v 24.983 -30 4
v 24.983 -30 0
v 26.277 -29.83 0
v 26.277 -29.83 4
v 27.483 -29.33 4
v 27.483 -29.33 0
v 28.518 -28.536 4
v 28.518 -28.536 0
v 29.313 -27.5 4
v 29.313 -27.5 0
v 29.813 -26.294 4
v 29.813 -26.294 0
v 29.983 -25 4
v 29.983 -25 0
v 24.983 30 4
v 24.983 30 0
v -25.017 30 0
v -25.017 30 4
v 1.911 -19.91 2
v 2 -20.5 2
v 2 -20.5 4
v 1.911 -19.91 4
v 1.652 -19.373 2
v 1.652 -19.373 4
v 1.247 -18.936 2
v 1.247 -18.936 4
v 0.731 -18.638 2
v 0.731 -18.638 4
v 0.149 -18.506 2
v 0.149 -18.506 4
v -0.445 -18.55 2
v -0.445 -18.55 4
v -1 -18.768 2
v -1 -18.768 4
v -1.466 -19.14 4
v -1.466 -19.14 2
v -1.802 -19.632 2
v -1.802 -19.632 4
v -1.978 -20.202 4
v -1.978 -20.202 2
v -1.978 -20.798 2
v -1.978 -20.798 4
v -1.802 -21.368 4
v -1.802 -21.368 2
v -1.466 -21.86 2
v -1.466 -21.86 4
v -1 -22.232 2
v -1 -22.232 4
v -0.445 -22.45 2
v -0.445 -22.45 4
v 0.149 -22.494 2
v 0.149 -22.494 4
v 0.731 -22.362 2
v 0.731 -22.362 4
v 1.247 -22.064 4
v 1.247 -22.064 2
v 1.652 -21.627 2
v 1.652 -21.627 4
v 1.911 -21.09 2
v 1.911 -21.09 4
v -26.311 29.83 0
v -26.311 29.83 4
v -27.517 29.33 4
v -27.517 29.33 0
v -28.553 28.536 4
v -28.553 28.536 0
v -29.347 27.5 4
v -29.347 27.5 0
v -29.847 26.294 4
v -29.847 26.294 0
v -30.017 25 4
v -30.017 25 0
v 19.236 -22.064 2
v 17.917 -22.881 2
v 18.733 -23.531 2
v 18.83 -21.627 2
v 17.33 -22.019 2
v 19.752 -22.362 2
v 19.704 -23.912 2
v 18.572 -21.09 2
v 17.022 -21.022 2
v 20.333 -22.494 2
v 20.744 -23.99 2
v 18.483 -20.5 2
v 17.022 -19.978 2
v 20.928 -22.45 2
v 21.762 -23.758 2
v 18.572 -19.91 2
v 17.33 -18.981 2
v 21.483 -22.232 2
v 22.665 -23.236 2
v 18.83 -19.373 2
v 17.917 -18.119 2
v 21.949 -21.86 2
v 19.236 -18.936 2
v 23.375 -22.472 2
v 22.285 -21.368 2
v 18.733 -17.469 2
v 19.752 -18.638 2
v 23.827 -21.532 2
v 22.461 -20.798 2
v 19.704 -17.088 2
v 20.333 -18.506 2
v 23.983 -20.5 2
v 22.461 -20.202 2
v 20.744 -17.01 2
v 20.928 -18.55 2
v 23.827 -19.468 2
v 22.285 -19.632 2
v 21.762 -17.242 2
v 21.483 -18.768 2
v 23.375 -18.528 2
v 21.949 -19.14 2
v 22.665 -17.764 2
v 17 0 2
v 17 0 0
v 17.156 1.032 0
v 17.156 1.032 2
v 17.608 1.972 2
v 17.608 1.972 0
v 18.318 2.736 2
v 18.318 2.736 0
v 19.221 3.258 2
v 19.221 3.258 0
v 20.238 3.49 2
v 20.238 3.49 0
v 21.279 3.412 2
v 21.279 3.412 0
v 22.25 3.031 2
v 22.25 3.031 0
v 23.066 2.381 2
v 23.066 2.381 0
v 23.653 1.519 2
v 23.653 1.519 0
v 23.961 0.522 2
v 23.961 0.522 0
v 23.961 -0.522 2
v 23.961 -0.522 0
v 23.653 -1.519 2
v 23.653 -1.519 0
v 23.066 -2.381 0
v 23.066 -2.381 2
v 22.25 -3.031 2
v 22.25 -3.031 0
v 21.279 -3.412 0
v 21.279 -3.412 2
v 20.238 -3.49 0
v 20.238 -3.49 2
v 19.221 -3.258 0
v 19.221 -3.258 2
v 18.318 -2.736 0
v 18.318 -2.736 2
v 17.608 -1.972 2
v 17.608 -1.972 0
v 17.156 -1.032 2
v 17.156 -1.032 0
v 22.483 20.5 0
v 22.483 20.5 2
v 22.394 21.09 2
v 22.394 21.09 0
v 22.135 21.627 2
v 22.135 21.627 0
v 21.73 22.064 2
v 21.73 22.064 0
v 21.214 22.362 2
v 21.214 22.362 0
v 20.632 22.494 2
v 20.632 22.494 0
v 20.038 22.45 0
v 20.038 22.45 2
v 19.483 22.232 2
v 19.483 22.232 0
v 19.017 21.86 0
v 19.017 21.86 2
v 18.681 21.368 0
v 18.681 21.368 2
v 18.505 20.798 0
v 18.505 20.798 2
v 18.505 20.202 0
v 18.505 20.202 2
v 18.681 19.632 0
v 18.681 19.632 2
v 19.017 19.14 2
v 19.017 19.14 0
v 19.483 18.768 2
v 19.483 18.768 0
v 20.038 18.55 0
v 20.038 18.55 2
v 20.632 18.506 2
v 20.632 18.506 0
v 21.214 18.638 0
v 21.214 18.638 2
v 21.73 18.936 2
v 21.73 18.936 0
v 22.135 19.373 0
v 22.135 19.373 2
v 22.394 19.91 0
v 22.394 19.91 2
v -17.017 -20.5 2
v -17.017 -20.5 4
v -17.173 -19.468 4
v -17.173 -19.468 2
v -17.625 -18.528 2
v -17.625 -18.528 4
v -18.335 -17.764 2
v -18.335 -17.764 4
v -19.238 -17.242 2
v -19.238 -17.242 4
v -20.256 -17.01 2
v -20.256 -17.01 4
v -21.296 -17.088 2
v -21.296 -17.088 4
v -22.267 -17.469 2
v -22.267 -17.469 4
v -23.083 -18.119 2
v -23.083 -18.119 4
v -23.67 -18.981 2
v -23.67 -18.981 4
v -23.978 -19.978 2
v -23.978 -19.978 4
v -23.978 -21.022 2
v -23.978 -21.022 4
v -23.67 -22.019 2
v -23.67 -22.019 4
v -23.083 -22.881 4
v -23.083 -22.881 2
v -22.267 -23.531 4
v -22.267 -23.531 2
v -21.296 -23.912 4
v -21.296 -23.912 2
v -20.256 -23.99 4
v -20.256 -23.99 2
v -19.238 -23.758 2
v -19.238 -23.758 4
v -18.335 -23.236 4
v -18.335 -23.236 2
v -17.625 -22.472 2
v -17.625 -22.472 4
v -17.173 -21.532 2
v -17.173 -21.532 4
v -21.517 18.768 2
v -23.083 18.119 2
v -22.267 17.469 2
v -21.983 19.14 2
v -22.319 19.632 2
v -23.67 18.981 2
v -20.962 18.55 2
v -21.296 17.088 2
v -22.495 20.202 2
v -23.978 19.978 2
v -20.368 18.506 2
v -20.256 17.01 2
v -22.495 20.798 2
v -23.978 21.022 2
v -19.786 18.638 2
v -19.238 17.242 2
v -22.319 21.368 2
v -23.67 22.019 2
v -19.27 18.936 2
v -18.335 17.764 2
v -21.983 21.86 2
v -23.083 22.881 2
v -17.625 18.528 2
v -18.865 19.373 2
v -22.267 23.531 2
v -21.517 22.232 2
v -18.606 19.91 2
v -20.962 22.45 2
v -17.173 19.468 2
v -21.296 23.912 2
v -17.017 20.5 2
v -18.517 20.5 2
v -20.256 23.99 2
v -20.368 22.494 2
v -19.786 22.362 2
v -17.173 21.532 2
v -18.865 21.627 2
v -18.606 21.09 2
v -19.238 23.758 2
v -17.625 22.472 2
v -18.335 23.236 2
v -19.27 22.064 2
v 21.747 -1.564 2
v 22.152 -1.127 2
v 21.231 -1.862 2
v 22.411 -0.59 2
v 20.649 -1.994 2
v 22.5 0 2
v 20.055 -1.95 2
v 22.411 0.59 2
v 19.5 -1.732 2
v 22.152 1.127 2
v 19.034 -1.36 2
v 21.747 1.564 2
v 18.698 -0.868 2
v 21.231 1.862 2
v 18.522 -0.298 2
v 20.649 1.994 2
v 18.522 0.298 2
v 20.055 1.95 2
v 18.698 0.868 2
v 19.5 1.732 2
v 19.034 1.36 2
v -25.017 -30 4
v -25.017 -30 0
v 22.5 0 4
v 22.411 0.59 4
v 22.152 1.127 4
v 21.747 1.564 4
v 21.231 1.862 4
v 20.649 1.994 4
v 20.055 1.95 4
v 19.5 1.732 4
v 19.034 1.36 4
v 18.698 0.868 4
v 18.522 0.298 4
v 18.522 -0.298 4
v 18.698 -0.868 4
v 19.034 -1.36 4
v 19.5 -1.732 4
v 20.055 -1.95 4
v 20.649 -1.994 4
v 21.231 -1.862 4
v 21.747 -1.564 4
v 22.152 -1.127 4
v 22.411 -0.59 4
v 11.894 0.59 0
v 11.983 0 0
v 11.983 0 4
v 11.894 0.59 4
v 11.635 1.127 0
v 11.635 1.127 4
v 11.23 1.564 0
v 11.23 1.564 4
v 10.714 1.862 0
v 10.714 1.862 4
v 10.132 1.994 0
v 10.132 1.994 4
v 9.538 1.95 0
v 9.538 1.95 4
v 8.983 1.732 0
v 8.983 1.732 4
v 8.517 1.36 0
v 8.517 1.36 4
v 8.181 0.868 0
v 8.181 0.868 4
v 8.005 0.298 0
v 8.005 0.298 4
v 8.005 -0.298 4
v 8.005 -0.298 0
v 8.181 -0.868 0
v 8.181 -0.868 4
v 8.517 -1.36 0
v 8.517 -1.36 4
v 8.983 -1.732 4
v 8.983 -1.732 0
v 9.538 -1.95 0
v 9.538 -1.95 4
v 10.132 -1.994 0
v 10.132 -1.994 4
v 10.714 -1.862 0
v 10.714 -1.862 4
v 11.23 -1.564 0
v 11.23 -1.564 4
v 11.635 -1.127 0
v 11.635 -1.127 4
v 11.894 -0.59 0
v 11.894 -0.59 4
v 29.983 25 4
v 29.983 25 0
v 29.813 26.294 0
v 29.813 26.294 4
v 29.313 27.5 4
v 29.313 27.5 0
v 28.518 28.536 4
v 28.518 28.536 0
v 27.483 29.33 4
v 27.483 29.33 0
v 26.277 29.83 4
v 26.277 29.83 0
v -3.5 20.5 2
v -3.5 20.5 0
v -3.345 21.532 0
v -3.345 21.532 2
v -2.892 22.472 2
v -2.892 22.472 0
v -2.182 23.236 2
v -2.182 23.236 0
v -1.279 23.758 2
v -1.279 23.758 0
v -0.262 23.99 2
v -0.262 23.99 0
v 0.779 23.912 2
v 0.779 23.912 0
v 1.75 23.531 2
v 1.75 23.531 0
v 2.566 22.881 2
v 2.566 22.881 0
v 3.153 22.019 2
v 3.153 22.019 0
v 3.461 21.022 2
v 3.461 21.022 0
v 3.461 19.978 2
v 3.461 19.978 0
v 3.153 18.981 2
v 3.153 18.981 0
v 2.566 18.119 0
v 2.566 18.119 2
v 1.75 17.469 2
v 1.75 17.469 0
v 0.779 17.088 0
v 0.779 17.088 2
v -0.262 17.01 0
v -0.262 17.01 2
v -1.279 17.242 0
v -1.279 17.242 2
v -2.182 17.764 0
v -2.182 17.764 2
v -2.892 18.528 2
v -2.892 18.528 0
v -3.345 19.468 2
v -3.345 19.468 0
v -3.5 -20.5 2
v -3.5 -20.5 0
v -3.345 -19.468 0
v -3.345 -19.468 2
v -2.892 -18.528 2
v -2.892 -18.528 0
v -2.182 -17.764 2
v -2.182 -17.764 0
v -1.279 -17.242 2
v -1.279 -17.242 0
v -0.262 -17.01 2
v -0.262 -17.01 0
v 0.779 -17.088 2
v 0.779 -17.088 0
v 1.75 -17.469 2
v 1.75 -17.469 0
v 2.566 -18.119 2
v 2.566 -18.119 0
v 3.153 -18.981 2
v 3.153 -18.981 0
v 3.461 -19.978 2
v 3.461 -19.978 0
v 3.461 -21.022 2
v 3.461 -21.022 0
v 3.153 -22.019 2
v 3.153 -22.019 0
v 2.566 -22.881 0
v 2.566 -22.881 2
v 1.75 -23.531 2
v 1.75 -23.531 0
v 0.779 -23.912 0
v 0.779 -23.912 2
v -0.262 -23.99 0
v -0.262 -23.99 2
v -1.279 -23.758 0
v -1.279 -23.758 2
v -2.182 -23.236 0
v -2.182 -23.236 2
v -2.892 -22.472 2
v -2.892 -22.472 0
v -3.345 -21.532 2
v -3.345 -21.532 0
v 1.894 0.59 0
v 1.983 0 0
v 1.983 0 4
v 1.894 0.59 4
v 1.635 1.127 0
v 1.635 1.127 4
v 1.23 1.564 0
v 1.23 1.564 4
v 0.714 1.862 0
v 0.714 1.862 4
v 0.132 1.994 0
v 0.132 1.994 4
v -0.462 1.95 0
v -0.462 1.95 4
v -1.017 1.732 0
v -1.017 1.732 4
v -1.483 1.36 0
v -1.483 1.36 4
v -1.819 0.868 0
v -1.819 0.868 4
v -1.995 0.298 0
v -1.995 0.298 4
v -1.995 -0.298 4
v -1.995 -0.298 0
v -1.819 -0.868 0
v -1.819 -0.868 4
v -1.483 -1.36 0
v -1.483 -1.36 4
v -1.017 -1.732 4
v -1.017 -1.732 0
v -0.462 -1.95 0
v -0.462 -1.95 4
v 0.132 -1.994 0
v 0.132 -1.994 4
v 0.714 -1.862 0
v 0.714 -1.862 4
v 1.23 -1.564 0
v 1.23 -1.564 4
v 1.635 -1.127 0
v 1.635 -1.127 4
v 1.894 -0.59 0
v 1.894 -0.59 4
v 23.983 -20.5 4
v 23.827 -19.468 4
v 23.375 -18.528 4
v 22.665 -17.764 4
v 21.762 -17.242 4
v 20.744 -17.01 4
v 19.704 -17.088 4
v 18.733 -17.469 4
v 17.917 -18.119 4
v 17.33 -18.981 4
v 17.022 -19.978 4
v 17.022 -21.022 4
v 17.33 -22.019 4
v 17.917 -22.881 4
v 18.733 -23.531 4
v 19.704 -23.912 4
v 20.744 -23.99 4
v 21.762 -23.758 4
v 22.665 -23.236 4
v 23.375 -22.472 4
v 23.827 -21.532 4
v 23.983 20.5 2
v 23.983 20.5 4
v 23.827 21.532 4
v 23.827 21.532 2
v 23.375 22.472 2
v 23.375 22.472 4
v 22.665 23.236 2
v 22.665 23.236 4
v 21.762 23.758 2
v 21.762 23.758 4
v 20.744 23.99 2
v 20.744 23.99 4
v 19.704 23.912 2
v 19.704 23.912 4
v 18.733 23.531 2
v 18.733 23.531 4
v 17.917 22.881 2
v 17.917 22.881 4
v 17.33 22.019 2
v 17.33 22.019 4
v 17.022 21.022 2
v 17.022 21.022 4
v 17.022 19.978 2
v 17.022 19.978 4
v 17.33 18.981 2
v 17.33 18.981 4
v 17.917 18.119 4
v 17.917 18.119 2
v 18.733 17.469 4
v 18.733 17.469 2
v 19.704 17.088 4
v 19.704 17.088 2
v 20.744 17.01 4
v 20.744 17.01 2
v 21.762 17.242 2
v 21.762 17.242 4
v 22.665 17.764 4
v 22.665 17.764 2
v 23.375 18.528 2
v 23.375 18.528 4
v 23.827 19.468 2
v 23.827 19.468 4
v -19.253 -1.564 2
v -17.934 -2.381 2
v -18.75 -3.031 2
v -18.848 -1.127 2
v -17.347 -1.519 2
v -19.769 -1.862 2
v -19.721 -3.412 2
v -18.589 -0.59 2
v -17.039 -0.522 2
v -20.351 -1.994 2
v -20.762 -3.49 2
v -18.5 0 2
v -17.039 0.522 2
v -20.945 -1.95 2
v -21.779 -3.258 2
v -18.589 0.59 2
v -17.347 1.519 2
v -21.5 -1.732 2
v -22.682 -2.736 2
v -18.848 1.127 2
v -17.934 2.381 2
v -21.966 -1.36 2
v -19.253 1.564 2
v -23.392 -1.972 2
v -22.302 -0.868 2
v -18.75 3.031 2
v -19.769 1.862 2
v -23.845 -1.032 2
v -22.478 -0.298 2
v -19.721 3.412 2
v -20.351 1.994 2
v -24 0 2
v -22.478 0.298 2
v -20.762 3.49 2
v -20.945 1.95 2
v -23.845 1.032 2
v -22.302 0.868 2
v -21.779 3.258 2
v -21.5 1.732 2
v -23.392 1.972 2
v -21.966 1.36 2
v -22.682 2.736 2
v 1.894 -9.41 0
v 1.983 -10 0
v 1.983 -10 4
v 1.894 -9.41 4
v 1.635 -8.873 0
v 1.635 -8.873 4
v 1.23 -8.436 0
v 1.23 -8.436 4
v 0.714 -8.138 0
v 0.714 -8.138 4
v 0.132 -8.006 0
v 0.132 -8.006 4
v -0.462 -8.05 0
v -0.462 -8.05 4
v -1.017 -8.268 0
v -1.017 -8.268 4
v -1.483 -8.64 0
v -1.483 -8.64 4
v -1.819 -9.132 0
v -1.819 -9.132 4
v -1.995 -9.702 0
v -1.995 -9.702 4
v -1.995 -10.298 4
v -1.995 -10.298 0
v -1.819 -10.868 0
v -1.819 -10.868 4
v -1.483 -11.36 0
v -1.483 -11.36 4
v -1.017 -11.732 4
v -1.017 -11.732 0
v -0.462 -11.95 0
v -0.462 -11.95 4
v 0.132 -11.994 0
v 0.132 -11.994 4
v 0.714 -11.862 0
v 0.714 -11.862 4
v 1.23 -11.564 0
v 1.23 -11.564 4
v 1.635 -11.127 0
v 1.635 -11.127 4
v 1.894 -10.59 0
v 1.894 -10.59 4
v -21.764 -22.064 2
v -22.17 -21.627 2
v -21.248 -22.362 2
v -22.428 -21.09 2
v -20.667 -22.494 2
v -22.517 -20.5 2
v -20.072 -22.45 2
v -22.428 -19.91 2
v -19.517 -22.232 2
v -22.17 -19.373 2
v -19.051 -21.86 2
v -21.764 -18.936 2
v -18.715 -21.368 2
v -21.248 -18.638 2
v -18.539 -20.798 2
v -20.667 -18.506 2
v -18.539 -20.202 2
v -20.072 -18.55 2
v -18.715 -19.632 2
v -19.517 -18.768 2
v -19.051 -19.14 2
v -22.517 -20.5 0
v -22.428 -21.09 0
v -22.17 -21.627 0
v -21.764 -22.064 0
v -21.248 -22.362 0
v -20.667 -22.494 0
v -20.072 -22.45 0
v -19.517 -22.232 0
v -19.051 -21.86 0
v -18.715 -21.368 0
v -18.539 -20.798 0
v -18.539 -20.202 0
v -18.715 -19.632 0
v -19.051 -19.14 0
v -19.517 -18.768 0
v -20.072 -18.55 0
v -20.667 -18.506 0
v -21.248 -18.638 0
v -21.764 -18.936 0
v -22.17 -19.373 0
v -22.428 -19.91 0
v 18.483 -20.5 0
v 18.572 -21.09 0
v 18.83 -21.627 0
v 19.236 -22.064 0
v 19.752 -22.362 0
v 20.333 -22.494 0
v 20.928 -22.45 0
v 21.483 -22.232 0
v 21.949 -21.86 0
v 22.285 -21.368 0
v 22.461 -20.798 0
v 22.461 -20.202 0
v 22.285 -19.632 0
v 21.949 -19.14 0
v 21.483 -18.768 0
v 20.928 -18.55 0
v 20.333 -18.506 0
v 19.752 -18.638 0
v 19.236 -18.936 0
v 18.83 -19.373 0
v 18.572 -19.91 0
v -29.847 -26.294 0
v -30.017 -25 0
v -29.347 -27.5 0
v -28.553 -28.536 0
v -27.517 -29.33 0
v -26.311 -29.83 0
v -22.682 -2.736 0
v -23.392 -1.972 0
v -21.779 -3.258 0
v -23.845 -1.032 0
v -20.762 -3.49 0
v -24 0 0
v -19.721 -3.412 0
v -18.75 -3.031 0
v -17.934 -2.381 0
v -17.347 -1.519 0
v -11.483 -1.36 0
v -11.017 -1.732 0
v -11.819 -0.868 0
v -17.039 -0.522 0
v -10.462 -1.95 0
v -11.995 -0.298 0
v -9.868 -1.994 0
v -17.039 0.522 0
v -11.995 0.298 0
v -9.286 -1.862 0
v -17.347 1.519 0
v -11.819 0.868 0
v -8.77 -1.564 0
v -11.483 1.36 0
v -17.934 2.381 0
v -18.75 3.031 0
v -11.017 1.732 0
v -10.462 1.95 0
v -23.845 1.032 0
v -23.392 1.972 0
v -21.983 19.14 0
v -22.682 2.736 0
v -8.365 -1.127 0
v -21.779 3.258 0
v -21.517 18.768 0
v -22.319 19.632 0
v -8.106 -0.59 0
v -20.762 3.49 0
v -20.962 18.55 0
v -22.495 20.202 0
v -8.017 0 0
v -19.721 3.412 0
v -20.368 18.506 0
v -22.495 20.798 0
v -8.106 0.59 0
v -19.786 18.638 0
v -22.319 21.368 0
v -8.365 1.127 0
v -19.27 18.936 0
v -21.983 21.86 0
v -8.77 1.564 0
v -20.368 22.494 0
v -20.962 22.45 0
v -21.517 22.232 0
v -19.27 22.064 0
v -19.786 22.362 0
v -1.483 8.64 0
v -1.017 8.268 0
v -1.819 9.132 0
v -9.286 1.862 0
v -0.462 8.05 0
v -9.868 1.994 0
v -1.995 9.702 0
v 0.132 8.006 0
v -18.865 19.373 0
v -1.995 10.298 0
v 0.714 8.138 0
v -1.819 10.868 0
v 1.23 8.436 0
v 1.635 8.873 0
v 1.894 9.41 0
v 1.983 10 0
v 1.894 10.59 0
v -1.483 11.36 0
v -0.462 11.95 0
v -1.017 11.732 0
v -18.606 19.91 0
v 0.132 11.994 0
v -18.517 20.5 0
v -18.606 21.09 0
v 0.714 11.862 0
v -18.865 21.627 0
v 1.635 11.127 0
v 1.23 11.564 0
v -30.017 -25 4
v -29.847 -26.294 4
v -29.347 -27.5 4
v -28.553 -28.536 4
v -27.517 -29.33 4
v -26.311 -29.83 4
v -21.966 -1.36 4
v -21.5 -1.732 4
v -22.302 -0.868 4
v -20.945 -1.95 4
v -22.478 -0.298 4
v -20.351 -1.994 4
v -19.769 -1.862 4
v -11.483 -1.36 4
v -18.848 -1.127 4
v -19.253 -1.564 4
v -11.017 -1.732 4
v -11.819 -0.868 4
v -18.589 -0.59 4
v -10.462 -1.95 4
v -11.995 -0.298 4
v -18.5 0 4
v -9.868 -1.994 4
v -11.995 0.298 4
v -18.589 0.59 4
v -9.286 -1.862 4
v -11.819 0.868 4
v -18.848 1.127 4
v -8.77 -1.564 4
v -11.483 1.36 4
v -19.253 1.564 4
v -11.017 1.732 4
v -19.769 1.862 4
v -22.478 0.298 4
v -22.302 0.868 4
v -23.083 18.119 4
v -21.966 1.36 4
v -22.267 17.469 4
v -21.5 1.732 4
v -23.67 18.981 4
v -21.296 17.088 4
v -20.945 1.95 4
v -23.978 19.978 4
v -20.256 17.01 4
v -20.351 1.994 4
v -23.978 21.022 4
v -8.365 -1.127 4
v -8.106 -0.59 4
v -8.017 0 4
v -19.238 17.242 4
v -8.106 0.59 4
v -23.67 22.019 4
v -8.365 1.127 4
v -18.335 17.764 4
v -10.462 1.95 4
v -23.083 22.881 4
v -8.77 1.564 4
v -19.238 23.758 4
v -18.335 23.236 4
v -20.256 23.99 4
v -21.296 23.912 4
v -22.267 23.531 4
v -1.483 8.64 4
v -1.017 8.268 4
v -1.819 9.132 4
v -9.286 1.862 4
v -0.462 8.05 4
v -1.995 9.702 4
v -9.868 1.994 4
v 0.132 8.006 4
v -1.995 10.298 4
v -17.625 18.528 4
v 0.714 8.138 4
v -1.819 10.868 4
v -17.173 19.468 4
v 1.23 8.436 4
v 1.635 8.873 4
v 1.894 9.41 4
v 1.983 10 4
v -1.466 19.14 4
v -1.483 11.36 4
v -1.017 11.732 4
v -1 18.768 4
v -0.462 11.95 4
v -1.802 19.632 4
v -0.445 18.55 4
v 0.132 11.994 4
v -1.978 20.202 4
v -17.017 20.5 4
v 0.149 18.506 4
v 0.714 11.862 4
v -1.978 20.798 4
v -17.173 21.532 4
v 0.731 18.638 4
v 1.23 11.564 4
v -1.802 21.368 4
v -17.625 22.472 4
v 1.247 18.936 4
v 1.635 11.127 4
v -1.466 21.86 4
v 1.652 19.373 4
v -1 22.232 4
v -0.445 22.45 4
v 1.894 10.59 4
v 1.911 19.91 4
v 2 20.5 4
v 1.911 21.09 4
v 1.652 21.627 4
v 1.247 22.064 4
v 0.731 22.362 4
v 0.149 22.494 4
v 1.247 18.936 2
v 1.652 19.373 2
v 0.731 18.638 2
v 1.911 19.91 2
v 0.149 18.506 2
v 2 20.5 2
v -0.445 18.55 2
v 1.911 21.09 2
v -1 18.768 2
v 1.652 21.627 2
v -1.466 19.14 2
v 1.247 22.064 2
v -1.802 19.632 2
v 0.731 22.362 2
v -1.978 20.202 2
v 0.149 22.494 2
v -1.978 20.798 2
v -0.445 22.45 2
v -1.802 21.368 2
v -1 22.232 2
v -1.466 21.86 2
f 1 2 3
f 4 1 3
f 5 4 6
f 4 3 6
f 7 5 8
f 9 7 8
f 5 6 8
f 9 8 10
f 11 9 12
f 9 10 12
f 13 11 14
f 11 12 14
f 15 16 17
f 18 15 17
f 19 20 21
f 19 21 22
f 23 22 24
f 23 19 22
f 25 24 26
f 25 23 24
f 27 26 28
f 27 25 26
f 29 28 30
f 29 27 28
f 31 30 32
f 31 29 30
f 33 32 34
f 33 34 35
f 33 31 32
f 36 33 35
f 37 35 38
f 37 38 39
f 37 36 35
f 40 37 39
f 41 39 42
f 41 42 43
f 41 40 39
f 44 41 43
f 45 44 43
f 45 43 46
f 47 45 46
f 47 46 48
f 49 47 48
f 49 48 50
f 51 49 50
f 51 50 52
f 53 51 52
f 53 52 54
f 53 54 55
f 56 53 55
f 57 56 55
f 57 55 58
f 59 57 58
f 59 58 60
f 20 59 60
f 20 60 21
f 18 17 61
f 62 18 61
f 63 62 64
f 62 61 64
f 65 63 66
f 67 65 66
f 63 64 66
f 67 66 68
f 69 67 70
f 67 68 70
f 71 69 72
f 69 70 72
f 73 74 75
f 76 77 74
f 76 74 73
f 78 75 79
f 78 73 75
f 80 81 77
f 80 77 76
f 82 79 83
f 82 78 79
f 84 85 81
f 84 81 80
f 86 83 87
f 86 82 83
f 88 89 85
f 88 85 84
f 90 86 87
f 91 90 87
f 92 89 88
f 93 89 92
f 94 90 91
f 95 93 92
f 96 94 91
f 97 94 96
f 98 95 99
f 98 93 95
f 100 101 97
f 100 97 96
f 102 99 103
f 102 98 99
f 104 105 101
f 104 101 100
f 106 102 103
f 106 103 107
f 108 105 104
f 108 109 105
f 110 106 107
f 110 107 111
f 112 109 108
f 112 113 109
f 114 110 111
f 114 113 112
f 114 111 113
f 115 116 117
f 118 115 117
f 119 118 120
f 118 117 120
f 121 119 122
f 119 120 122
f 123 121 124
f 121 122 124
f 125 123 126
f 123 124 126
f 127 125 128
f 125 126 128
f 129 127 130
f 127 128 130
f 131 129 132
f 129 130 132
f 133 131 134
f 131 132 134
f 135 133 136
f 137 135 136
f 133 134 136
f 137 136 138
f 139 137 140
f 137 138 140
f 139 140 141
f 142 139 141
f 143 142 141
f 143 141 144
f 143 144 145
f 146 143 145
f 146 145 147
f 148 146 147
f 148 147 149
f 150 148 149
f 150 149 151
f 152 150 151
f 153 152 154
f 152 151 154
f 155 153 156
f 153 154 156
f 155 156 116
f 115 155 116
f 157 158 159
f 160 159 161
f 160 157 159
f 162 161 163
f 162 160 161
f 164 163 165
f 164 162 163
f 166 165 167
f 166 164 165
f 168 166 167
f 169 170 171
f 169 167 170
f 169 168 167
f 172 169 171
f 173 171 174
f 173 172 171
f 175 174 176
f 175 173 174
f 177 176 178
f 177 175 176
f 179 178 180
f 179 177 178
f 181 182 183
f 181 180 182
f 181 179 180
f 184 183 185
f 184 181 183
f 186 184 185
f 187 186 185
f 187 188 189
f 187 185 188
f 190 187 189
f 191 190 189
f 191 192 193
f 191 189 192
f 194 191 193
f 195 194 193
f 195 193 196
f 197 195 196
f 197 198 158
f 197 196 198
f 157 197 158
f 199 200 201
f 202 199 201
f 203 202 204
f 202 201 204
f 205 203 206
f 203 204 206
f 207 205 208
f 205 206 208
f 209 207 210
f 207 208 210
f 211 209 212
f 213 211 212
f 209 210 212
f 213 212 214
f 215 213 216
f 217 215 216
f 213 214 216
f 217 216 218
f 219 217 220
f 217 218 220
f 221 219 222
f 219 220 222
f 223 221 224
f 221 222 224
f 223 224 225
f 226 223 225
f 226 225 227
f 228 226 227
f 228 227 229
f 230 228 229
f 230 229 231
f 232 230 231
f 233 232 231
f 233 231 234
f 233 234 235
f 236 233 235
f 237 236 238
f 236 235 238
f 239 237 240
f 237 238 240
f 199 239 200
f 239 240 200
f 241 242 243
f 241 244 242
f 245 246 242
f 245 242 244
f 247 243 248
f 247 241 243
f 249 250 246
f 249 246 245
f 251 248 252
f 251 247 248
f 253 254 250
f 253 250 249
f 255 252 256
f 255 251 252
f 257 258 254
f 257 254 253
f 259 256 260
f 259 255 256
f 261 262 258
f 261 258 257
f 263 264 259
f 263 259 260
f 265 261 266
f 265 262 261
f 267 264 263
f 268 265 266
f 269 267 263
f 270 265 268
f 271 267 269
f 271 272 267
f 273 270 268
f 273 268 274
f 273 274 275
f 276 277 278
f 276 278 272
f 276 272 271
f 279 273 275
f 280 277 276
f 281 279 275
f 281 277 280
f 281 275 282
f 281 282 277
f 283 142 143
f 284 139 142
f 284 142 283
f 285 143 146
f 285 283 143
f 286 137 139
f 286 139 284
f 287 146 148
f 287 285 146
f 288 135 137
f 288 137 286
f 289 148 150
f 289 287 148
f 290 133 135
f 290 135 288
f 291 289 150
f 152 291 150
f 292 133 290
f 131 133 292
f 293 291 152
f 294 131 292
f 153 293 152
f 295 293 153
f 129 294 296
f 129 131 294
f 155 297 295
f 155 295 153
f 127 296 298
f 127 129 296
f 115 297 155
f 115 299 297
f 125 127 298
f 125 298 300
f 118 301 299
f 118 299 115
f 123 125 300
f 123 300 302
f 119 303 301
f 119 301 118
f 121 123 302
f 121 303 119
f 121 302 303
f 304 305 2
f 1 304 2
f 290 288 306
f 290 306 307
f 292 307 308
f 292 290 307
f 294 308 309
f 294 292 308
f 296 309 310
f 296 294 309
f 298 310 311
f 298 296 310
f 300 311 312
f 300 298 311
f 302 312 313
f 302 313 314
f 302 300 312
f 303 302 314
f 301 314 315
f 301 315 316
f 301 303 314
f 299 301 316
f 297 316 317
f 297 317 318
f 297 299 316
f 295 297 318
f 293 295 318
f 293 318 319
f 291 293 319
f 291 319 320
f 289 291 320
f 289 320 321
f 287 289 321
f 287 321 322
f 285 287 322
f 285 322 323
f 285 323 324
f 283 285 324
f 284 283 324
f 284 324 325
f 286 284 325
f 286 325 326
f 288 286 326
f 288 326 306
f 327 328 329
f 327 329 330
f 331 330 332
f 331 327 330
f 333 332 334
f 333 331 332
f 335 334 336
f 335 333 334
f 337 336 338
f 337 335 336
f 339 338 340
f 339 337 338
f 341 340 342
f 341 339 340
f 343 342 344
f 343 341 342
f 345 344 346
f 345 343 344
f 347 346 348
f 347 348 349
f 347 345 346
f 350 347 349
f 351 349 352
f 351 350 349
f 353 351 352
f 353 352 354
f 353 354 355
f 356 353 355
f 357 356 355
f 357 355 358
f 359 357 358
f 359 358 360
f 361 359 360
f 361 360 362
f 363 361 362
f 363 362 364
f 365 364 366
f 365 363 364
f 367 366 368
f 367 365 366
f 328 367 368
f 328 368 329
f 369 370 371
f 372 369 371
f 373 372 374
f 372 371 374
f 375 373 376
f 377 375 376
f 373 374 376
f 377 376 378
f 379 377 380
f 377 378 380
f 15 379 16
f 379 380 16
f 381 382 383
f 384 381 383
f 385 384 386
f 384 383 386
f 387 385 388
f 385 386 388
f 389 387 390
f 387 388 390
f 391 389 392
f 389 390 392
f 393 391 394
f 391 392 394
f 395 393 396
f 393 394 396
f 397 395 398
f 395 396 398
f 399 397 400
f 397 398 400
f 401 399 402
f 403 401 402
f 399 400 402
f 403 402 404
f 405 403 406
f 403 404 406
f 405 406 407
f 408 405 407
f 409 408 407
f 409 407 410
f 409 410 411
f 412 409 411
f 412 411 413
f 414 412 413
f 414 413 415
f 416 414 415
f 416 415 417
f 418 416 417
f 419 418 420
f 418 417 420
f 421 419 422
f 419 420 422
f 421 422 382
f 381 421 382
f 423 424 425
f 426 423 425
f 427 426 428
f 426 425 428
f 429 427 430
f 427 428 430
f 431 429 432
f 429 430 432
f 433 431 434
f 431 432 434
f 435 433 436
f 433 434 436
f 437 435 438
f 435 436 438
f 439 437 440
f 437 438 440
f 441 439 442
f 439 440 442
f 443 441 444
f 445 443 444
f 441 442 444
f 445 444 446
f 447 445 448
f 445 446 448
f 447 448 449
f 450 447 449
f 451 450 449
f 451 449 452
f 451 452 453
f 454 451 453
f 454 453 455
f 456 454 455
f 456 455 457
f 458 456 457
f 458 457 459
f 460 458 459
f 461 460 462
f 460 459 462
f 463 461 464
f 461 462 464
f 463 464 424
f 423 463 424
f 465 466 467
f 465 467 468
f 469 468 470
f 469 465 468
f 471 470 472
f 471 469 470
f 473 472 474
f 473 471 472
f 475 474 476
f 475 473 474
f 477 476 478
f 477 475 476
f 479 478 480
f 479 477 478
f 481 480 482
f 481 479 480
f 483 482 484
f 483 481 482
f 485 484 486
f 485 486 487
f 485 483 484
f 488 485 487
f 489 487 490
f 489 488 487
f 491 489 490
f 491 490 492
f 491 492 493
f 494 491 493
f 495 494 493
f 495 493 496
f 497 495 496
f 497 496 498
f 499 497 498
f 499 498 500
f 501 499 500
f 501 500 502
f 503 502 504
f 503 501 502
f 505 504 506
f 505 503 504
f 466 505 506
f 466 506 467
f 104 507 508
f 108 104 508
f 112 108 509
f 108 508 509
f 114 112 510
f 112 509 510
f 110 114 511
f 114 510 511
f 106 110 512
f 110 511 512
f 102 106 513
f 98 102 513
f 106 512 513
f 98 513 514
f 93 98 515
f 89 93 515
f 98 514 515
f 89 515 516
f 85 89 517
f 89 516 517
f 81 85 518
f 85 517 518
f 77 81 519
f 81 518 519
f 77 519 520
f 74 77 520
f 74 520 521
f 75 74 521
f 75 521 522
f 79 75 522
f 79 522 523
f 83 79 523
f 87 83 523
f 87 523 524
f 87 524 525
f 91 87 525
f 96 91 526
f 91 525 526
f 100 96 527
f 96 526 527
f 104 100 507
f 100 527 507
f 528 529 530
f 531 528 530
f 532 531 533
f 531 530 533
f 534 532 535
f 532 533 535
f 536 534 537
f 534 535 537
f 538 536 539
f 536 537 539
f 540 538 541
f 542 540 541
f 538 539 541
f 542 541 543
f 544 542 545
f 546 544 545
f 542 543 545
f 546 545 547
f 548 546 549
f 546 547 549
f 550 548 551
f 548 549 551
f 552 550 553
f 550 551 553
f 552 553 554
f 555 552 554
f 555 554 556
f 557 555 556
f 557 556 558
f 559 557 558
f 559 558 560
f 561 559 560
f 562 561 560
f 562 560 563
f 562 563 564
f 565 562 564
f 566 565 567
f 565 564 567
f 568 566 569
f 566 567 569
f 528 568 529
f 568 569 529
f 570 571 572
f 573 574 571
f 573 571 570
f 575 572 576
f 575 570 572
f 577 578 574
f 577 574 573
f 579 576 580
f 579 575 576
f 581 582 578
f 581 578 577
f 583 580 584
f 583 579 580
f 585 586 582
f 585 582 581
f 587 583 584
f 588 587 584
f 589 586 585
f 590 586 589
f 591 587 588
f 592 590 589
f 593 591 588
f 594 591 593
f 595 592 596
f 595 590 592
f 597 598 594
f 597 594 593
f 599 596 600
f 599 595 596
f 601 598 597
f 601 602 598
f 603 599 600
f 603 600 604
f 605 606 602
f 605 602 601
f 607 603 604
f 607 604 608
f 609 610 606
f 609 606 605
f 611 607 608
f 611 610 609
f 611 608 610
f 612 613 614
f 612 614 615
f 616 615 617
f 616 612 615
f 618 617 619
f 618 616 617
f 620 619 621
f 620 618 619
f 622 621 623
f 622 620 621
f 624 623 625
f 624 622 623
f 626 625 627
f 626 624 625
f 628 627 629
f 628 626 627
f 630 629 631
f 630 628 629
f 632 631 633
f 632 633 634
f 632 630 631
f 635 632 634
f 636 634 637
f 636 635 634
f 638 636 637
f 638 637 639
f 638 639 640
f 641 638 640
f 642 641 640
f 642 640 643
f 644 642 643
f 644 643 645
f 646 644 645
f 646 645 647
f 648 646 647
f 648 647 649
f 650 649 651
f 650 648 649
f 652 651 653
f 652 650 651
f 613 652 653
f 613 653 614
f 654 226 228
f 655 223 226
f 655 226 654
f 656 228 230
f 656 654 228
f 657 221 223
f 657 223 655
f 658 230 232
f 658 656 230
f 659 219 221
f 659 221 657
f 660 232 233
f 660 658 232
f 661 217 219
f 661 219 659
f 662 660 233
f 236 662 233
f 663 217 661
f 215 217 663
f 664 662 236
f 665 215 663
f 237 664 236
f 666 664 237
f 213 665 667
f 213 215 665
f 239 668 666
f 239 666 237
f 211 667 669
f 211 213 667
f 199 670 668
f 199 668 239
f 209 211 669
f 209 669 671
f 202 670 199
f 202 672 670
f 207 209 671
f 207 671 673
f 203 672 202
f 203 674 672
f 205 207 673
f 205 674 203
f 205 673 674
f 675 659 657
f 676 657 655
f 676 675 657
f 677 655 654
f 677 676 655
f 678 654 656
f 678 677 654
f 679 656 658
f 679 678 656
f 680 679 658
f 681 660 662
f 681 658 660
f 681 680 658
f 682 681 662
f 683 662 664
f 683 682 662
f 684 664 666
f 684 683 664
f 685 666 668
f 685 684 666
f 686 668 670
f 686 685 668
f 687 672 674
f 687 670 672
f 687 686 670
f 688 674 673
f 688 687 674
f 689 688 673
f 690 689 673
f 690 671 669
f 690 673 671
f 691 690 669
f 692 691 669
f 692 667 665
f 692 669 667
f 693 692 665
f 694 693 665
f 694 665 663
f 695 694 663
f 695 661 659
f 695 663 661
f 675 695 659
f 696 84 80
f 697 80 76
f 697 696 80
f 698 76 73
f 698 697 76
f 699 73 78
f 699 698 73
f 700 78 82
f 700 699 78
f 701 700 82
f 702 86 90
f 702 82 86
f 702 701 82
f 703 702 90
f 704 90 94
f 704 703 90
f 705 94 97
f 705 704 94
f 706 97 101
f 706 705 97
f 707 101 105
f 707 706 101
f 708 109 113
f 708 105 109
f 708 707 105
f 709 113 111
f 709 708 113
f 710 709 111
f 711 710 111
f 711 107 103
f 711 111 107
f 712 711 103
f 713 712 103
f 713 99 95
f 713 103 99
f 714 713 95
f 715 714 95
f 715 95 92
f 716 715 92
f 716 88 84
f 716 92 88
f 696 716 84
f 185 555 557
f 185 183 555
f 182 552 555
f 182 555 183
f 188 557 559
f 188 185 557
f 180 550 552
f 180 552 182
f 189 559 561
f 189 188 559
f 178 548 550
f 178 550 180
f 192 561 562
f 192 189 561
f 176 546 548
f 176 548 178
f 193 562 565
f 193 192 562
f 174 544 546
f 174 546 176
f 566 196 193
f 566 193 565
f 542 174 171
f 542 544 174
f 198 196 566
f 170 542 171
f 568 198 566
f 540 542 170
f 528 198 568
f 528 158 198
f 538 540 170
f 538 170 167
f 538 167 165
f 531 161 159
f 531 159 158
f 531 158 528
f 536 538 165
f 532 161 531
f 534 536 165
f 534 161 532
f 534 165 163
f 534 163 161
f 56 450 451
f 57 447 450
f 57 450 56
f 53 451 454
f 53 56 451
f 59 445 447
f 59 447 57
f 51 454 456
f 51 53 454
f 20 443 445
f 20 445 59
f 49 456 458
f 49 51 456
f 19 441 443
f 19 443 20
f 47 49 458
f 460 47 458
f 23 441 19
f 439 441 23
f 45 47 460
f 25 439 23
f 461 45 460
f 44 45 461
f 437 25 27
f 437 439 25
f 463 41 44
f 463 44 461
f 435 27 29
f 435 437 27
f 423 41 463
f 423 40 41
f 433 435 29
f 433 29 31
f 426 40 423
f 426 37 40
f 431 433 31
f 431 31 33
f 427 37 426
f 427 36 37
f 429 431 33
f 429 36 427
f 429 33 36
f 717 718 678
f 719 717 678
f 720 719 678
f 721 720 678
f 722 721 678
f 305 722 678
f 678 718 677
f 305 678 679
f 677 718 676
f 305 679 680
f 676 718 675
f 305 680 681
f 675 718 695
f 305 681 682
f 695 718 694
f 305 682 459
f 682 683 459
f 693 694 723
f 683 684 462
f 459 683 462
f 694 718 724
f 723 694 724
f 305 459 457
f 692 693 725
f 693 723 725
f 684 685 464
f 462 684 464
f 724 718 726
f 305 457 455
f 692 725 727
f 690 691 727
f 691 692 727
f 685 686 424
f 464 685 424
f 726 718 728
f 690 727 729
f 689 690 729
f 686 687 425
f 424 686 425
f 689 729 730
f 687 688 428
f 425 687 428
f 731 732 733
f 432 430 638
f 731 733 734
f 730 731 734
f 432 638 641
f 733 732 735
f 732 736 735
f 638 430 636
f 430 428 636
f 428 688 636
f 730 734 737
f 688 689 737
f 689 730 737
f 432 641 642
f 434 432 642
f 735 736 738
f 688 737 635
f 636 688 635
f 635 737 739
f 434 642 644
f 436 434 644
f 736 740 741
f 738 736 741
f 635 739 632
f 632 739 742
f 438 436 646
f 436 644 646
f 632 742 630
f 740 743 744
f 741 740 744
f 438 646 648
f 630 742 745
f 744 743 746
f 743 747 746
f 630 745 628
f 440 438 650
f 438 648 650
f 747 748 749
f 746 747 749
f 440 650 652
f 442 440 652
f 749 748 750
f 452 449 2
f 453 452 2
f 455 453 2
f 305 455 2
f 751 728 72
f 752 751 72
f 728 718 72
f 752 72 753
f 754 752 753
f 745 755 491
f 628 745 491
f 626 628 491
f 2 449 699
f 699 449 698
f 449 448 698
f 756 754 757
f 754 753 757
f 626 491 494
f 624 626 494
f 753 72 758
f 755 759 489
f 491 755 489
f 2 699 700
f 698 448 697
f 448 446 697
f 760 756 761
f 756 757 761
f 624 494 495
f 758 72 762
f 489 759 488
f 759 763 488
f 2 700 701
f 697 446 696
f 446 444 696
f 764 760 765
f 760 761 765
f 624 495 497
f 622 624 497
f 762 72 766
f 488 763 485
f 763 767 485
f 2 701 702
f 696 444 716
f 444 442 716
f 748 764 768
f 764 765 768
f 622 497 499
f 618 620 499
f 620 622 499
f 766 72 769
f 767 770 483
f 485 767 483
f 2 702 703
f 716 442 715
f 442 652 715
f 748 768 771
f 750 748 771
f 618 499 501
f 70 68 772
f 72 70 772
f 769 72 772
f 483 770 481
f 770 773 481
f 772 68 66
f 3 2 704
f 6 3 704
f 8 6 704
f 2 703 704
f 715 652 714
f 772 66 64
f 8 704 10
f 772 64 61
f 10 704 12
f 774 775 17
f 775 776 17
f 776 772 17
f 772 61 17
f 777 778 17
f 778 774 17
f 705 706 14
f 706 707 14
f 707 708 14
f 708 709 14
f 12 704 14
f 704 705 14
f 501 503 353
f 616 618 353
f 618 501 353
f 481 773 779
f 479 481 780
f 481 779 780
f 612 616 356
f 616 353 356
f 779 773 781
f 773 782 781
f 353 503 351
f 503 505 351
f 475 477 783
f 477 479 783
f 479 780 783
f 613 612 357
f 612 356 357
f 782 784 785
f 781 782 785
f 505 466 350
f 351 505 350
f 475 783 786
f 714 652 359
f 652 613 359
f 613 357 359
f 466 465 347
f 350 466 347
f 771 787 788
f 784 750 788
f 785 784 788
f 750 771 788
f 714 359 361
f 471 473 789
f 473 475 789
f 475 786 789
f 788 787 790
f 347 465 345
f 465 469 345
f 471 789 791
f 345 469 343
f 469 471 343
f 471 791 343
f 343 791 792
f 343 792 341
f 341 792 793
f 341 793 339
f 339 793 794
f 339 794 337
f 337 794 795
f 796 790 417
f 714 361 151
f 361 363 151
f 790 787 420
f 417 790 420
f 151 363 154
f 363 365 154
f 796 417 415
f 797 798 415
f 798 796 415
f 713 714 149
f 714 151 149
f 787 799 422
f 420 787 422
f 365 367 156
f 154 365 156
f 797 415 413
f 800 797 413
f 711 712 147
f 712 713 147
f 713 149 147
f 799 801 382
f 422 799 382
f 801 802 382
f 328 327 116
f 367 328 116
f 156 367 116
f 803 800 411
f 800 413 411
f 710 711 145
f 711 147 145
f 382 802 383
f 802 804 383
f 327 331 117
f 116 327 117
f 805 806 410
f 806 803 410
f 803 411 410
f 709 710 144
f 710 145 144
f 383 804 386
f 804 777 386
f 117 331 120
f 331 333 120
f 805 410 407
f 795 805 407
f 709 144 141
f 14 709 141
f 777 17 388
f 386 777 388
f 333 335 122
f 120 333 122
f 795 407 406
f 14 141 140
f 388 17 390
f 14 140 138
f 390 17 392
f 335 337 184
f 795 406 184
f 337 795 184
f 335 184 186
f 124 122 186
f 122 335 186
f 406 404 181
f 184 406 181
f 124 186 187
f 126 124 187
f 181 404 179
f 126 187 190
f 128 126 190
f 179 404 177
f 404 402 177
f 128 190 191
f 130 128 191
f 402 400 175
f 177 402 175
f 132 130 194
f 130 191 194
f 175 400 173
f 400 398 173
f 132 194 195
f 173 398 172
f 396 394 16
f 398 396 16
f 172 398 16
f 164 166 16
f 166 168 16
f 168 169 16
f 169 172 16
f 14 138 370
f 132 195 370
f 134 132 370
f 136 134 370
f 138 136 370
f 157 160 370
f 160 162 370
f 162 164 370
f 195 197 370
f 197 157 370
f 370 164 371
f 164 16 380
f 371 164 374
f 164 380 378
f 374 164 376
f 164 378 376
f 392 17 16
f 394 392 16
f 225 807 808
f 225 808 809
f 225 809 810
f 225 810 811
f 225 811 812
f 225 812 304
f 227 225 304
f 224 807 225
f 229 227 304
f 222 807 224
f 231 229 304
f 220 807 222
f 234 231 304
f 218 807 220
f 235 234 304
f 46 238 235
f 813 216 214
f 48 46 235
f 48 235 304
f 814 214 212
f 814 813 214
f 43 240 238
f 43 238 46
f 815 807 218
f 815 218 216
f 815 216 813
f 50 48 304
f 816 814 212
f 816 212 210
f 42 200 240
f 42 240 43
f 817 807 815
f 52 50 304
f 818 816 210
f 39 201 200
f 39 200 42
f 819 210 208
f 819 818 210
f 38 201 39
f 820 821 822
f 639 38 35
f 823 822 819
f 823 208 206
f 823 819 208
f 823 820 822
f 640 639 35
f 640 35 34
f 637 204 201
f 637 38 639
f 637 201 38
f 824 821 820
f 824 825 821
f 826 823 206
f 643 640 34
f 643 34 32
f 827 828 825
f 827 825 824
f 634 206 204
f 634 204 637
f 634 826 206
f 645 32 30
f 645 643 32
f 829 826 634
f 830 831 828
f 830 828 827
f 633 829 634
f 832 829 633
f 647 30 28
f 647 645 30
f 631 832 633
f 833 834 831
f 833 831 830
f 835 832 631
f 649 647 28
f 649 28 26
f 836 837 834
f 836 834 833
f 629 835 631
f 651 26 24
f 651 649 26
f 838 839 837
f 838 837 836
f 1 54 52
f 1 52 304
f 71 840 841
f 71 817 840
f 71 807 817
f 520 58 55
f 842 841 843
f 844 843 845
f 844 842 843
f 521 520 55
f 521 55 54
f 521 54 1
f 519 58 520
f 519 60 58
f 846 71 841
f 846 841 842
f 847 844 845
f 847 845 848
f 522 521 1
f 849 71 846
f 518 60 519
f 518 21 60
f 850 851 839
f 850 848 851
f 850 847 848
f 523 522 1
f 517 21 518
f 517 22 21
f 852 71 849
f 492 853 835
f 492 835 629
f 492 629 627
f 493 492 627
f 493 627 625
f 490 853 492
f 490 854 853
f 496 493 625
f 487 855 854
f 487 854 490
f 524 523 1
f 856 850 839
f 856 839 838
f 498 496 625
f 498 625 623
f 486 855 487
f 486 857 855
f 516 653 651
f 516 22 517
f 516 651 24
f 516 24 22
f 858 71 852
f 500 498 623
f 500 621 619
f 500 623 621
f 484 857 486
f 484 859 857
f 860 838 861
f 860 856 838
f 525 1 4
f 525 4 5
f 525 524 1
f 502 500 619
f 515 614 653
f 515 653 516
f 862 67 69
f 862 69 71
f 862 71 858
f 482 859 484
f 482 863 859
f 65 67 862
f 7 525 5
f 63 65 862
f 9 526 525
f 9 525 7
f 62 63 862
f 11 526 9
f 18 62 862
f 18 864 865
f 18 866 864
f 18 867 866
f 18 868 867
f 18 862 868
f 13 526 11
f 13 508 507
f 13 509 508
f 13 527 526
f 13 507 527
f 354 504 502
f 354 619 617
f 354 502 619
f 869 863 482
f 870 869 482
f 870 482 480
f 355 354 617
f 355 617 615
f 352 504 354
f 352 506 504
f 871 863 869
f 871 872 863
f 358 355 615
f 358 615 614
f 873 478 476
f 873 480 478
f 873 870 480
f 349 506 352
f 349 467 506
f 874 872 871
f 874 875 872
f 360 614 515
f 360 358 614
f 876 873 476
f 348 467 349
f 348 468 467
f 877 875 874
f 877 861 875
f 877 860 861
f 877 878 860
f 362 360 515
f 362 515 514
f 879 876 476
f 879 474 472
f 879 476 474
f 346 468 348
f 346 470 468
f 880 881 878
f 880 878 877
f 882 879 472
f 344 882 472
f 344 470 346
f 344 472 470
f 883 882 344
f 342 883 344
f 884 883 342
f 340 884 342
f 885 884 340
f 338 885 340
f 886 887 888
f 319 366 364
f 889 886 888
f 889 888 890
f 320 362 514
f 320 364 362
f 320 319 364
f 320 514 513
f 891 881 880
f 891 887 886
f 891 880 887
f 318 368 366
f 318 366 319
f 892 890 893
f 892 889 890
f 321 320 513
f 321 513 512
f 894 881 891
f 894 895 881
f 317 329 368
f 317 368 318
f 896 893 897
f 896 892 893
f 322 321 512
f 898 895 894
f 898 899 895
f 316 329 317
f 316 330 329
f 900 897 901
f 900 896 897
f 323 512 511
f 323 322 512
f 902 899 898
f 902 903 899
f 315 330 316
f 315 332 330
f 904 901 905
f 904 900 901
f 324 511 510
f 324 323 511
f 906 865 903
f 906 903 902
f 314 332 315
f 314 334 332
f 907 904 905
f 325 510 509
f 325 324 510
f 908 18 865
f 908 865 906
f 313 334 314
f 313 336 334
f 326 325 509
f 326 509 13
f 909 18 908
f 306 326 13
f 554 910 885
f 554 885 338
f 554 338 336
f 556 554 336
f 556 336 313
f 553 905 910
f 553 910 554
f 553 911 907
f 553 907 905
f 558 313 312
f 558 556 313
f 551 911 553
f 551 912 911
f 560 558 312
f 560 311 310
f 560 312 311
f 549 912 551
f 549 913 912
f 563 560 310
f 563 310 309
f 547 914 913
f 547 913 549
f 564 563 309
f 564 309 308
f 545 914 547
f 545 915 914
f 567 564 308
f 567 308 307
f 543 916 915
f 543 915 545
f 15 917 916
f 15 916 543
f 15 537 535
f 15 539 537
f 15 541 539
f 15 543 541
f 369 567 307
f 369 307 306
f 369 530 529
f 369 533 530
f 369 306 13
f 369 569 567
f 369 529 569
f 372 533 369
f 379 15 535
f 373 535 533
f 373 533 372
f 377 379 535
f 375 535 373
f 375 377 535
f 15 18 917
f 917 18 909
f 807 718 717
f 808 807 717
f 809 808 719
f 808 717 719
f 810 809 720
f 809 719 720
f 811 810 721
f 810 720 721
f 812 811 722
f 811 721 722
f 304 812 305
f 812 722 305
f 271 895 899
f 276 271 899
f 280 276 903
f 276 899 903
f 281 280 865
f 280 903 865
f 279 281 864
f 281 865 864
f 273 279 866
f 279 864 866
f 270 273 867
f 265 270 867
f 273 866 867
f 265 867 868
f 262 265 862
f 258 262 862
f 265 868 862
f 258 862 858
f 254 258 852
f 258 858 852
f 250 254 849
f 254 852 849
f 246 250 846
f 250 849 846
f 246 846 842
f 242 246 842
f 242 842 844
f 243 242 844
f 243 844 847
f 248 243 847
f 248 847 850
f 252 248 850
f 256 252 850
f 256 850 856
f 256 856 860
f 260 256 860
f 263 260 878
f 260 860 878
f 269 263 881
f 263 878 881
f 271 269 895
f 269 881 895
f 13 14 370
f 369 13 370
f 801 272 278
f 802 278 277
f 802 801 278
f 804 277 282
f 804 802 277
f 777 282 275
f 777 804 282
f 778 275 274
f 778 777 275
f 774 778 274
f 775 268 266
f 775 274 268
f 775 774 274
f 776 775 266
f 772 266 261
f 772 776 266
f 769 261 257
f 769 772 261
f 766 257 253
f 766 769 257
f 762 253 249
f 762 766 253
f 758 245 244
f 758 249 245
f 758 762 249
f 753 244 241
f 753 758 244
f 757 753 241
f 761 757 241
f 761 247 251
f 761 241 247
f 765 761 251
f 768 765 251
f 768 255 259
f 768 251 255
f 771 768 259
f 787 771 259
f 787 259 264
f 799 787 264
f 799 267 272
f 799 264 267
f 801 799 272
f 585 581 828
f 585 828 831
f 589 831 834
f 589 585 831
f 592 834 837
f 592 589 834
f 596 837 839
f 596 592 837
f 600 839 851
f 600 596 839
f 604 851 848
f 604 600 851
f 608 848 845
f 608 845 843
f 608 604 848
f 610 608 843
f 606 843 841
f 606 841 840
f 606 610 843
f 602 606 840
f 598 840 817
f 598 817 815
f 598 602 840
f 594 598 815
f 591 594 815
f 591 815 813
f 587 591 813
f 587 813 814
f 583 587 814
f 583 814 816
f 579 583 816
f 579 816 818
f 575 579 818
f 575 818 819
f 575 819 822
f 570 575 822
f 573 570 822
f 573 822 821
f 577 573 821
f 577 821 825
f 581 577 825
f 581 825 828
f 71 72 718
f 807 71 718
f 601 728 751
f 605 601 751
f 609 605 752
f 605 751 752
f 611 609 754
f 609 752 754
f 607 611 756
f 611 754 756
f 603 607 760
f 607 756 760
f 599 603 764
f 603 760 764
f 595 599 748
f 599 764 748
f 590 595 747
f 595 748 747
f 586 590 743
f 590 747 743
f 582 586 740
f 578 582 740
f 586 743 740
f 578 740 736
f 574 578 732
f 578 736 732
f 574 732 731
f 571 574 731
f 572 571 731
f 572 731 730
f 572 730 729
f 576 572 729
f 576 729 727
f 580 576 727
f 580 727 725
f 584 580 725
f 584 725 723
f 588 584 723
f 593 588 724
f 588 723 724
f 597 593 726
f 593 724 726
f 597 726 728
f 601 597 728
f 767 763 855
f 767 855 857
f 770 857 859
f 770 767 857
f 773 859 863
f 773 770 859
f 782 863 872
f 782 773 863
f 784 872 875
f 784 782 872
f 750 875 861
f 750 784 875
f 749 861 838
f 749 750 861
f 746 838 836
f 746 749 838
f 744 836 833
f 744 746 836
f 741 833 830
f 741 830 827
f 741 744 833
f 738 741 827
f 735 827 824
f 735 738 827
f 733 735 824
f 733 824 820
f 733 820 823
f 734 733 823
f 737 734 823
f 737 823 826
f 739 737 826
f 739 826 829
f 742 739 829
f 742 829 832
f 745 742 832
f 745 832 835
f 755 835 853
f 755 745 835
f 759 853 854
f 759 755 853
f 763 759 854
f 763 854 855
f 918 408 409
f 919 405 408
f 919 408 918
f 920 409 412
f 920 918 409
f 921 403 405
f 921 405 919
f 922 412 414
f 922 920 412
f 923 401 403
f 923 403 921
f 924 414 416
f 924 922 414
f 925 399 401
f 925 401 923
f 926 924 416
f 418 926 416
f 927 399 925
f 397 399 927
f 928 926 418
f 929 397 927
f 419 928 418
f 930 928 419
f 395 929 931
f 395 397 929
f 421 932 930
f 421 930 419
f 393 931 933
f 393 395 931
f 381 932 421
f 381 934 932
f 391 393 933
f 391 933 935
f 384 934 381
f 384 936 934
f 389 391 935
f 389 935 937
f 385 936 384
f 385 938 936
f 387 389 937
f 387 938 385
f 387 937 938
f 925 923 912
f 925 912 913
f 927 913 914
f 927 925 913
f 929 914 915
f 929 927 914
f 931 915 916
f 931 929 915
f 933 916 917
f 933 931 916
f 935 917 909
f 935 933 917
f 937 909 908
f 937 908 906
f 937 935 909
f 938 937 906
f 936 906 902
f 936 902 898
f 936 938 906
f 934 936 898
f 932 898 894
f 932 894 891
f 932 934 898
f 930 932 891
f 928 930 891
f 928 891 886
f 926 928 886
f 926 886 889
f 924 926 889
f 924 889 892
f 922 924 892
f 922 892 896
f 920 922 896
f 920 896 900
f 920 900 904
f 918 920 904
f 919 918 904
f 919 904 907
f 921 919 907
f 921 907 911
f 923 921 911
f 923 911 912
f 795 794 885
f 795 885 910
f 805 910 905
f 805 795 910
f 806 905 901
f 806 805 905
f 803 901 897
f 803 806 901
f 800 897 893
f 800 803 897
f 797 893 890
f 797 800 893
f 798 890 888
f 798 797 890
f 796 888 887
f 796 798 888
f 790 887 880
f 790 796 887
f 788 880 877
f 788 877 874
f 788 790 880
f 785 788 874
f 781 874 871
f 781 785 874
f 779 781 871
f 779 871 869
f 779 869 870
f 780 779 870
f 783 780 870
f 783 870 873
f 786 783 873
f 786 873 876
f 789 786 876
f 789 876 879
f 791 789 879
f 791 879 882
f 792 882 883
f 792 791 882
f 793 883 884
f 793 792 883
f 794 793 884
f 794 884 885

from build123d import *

# Parameters (mm, degrees)
SKETCH1_R           = 2
BOSS_EXTRUDE2_DEPTH = 4
SKETCH2_R           = 3.5
CUT_EXTRUDE1_DEPTH  = 2
SKETCH3_R           = 3.5
CUT_EXTRUDE2_DEPTH  = 2


with BuildPart() as part:
    # Sketch1 → Boss-Extrude2 (new body)
    with BuildSketch(Plane.XY):
        with BuildLine():
            Line((29.982938543, -25.0000071), (29.982938543, 24.9999929))
            ThreePointArc((29.982938543, 24.9999929), (28.518472449, 28.535526806), (24.982938543, 29.9999929))
            Line((24.982938543, 29.9999929), (-25.017061457, 29.9999929))
            ThreePointArc((-25.017061457, 29.9999929), (-28.552595363, 28.535526806), (-30.017061457, 24.9999929))
            Line((-30.017061457, 24.9999929), (-30.017061457, -25.0000071))
            ThreePointArc((-30.017061457, -25.0000071), (-28.552595363, -28.535541006), (-25.017061457, -30.0000071))
            Line((-25.017061457, -30.0000071), (24.982938543, -30.0000071))
            ThreePointArc((24.982938543, -30.0000071), (28.518472449, -28.535541006), (29.982938543, -25.0000071))
        make_face()
        with Locations((-20.517061457, 20.4999929)):
            Circle(SKETCH1_R, mode=Mode.SUBTRACT)
        with Locations((-10.017061457, 0)):
            Circle(SKETCH1_R, mode=Mode.SUBTRACT)
        with Locations((-0.017061457, 0)):
            Circle(SKETCH1_R, mode=Mode.SUBTRACT)
        with Locations(Location((20.482938543, -20.5000071, 0), (0, 0, 180))):
            Circle(SKETCH1_R, mode=Mode.SUBTRACT)
        with Locations((0, 20.4999929)):
            Circle(SKETCH1_R, mode=Mode.SUBTRACT)
        with Locations((20.482938543, 20.4999929)):
            Circle(SKETCH1_R, mode=Mode.SUBTRACT)
        with Locations(Location((-20.517061457, -20.5000071, 0), (0, 0, 180))):
            Circle(SKETCH1_R, mode=Mode.SUBTRACT)
        with Locations((-0.017061457, 10)):
            Circle(SKETCH1_R, mode=Mode.SUBTRACT)
        with Locations((9.982938543, 0)):
            Circle(SKETCH1_R, mode=Mode.SUBTRACT)
        with Locations((-0.017061457, -10)):
            Circle(SKETCH1_R, mode=Mode.SUBTRACT)
        with Locations((20.5000071, 0)):
            Circle(SKETCH1_R, mode=Mode.SUBTRACT)
        with Locations((0, -20.5000071)):
            Circle(SKETCH1_R, mode=Mode.SUBTRACT)
        with Locations((-20.5, 0)):
            Circle(SKETCH1_R, mode=Mode.SUBTRACT)
    extrude(amount=BOSS_EXTRUDE2_DEPTH)

    # Sketch2 → Cut-Extrude1 (cut)
    with BuildSketch(Plane.XY.offset(4)):
        with Locations((-20.517061457, 20.4999929)):
            Circle(SKETCH2_R)
        with Locations((-20.517061457, -20.5000071)):
            Circle(SKETCH2_R)
        with Locations((20.482938543, -20.5000071)):
            Circle(SKETCH2_R)
        with Locations((20.482938543, 20.4999929)):
            Circle(SKETCH2_R)
    extrude(amount=-CUT_EXTRUDE1_DEPTH, mode=Mode.SUBTRACT)

    # Sketch3 → Cut-Extrude2 (cut)
    with BuildSketch(Plane(origin=(0, 0, 0), x_dir=(-1, 0, 0), z_dir=(0, 0, -1))):
        with Locations((-20.5000071, 0)):
            Circle(SKETCH3_R)
        with Locations((20.5, 0)):
            Circle(SKETCH3_R)
        with Locations((0, 20.4999929)):
            Circle(SKETCH3_R)
        with Locations((0, -20.5000071)):
            Circle(SKETCH3_R)
    extrude(amount=-CUT_EXTRUDE2_DEPTH, mode=Mode.SUBTRACT)


solid = part.part
